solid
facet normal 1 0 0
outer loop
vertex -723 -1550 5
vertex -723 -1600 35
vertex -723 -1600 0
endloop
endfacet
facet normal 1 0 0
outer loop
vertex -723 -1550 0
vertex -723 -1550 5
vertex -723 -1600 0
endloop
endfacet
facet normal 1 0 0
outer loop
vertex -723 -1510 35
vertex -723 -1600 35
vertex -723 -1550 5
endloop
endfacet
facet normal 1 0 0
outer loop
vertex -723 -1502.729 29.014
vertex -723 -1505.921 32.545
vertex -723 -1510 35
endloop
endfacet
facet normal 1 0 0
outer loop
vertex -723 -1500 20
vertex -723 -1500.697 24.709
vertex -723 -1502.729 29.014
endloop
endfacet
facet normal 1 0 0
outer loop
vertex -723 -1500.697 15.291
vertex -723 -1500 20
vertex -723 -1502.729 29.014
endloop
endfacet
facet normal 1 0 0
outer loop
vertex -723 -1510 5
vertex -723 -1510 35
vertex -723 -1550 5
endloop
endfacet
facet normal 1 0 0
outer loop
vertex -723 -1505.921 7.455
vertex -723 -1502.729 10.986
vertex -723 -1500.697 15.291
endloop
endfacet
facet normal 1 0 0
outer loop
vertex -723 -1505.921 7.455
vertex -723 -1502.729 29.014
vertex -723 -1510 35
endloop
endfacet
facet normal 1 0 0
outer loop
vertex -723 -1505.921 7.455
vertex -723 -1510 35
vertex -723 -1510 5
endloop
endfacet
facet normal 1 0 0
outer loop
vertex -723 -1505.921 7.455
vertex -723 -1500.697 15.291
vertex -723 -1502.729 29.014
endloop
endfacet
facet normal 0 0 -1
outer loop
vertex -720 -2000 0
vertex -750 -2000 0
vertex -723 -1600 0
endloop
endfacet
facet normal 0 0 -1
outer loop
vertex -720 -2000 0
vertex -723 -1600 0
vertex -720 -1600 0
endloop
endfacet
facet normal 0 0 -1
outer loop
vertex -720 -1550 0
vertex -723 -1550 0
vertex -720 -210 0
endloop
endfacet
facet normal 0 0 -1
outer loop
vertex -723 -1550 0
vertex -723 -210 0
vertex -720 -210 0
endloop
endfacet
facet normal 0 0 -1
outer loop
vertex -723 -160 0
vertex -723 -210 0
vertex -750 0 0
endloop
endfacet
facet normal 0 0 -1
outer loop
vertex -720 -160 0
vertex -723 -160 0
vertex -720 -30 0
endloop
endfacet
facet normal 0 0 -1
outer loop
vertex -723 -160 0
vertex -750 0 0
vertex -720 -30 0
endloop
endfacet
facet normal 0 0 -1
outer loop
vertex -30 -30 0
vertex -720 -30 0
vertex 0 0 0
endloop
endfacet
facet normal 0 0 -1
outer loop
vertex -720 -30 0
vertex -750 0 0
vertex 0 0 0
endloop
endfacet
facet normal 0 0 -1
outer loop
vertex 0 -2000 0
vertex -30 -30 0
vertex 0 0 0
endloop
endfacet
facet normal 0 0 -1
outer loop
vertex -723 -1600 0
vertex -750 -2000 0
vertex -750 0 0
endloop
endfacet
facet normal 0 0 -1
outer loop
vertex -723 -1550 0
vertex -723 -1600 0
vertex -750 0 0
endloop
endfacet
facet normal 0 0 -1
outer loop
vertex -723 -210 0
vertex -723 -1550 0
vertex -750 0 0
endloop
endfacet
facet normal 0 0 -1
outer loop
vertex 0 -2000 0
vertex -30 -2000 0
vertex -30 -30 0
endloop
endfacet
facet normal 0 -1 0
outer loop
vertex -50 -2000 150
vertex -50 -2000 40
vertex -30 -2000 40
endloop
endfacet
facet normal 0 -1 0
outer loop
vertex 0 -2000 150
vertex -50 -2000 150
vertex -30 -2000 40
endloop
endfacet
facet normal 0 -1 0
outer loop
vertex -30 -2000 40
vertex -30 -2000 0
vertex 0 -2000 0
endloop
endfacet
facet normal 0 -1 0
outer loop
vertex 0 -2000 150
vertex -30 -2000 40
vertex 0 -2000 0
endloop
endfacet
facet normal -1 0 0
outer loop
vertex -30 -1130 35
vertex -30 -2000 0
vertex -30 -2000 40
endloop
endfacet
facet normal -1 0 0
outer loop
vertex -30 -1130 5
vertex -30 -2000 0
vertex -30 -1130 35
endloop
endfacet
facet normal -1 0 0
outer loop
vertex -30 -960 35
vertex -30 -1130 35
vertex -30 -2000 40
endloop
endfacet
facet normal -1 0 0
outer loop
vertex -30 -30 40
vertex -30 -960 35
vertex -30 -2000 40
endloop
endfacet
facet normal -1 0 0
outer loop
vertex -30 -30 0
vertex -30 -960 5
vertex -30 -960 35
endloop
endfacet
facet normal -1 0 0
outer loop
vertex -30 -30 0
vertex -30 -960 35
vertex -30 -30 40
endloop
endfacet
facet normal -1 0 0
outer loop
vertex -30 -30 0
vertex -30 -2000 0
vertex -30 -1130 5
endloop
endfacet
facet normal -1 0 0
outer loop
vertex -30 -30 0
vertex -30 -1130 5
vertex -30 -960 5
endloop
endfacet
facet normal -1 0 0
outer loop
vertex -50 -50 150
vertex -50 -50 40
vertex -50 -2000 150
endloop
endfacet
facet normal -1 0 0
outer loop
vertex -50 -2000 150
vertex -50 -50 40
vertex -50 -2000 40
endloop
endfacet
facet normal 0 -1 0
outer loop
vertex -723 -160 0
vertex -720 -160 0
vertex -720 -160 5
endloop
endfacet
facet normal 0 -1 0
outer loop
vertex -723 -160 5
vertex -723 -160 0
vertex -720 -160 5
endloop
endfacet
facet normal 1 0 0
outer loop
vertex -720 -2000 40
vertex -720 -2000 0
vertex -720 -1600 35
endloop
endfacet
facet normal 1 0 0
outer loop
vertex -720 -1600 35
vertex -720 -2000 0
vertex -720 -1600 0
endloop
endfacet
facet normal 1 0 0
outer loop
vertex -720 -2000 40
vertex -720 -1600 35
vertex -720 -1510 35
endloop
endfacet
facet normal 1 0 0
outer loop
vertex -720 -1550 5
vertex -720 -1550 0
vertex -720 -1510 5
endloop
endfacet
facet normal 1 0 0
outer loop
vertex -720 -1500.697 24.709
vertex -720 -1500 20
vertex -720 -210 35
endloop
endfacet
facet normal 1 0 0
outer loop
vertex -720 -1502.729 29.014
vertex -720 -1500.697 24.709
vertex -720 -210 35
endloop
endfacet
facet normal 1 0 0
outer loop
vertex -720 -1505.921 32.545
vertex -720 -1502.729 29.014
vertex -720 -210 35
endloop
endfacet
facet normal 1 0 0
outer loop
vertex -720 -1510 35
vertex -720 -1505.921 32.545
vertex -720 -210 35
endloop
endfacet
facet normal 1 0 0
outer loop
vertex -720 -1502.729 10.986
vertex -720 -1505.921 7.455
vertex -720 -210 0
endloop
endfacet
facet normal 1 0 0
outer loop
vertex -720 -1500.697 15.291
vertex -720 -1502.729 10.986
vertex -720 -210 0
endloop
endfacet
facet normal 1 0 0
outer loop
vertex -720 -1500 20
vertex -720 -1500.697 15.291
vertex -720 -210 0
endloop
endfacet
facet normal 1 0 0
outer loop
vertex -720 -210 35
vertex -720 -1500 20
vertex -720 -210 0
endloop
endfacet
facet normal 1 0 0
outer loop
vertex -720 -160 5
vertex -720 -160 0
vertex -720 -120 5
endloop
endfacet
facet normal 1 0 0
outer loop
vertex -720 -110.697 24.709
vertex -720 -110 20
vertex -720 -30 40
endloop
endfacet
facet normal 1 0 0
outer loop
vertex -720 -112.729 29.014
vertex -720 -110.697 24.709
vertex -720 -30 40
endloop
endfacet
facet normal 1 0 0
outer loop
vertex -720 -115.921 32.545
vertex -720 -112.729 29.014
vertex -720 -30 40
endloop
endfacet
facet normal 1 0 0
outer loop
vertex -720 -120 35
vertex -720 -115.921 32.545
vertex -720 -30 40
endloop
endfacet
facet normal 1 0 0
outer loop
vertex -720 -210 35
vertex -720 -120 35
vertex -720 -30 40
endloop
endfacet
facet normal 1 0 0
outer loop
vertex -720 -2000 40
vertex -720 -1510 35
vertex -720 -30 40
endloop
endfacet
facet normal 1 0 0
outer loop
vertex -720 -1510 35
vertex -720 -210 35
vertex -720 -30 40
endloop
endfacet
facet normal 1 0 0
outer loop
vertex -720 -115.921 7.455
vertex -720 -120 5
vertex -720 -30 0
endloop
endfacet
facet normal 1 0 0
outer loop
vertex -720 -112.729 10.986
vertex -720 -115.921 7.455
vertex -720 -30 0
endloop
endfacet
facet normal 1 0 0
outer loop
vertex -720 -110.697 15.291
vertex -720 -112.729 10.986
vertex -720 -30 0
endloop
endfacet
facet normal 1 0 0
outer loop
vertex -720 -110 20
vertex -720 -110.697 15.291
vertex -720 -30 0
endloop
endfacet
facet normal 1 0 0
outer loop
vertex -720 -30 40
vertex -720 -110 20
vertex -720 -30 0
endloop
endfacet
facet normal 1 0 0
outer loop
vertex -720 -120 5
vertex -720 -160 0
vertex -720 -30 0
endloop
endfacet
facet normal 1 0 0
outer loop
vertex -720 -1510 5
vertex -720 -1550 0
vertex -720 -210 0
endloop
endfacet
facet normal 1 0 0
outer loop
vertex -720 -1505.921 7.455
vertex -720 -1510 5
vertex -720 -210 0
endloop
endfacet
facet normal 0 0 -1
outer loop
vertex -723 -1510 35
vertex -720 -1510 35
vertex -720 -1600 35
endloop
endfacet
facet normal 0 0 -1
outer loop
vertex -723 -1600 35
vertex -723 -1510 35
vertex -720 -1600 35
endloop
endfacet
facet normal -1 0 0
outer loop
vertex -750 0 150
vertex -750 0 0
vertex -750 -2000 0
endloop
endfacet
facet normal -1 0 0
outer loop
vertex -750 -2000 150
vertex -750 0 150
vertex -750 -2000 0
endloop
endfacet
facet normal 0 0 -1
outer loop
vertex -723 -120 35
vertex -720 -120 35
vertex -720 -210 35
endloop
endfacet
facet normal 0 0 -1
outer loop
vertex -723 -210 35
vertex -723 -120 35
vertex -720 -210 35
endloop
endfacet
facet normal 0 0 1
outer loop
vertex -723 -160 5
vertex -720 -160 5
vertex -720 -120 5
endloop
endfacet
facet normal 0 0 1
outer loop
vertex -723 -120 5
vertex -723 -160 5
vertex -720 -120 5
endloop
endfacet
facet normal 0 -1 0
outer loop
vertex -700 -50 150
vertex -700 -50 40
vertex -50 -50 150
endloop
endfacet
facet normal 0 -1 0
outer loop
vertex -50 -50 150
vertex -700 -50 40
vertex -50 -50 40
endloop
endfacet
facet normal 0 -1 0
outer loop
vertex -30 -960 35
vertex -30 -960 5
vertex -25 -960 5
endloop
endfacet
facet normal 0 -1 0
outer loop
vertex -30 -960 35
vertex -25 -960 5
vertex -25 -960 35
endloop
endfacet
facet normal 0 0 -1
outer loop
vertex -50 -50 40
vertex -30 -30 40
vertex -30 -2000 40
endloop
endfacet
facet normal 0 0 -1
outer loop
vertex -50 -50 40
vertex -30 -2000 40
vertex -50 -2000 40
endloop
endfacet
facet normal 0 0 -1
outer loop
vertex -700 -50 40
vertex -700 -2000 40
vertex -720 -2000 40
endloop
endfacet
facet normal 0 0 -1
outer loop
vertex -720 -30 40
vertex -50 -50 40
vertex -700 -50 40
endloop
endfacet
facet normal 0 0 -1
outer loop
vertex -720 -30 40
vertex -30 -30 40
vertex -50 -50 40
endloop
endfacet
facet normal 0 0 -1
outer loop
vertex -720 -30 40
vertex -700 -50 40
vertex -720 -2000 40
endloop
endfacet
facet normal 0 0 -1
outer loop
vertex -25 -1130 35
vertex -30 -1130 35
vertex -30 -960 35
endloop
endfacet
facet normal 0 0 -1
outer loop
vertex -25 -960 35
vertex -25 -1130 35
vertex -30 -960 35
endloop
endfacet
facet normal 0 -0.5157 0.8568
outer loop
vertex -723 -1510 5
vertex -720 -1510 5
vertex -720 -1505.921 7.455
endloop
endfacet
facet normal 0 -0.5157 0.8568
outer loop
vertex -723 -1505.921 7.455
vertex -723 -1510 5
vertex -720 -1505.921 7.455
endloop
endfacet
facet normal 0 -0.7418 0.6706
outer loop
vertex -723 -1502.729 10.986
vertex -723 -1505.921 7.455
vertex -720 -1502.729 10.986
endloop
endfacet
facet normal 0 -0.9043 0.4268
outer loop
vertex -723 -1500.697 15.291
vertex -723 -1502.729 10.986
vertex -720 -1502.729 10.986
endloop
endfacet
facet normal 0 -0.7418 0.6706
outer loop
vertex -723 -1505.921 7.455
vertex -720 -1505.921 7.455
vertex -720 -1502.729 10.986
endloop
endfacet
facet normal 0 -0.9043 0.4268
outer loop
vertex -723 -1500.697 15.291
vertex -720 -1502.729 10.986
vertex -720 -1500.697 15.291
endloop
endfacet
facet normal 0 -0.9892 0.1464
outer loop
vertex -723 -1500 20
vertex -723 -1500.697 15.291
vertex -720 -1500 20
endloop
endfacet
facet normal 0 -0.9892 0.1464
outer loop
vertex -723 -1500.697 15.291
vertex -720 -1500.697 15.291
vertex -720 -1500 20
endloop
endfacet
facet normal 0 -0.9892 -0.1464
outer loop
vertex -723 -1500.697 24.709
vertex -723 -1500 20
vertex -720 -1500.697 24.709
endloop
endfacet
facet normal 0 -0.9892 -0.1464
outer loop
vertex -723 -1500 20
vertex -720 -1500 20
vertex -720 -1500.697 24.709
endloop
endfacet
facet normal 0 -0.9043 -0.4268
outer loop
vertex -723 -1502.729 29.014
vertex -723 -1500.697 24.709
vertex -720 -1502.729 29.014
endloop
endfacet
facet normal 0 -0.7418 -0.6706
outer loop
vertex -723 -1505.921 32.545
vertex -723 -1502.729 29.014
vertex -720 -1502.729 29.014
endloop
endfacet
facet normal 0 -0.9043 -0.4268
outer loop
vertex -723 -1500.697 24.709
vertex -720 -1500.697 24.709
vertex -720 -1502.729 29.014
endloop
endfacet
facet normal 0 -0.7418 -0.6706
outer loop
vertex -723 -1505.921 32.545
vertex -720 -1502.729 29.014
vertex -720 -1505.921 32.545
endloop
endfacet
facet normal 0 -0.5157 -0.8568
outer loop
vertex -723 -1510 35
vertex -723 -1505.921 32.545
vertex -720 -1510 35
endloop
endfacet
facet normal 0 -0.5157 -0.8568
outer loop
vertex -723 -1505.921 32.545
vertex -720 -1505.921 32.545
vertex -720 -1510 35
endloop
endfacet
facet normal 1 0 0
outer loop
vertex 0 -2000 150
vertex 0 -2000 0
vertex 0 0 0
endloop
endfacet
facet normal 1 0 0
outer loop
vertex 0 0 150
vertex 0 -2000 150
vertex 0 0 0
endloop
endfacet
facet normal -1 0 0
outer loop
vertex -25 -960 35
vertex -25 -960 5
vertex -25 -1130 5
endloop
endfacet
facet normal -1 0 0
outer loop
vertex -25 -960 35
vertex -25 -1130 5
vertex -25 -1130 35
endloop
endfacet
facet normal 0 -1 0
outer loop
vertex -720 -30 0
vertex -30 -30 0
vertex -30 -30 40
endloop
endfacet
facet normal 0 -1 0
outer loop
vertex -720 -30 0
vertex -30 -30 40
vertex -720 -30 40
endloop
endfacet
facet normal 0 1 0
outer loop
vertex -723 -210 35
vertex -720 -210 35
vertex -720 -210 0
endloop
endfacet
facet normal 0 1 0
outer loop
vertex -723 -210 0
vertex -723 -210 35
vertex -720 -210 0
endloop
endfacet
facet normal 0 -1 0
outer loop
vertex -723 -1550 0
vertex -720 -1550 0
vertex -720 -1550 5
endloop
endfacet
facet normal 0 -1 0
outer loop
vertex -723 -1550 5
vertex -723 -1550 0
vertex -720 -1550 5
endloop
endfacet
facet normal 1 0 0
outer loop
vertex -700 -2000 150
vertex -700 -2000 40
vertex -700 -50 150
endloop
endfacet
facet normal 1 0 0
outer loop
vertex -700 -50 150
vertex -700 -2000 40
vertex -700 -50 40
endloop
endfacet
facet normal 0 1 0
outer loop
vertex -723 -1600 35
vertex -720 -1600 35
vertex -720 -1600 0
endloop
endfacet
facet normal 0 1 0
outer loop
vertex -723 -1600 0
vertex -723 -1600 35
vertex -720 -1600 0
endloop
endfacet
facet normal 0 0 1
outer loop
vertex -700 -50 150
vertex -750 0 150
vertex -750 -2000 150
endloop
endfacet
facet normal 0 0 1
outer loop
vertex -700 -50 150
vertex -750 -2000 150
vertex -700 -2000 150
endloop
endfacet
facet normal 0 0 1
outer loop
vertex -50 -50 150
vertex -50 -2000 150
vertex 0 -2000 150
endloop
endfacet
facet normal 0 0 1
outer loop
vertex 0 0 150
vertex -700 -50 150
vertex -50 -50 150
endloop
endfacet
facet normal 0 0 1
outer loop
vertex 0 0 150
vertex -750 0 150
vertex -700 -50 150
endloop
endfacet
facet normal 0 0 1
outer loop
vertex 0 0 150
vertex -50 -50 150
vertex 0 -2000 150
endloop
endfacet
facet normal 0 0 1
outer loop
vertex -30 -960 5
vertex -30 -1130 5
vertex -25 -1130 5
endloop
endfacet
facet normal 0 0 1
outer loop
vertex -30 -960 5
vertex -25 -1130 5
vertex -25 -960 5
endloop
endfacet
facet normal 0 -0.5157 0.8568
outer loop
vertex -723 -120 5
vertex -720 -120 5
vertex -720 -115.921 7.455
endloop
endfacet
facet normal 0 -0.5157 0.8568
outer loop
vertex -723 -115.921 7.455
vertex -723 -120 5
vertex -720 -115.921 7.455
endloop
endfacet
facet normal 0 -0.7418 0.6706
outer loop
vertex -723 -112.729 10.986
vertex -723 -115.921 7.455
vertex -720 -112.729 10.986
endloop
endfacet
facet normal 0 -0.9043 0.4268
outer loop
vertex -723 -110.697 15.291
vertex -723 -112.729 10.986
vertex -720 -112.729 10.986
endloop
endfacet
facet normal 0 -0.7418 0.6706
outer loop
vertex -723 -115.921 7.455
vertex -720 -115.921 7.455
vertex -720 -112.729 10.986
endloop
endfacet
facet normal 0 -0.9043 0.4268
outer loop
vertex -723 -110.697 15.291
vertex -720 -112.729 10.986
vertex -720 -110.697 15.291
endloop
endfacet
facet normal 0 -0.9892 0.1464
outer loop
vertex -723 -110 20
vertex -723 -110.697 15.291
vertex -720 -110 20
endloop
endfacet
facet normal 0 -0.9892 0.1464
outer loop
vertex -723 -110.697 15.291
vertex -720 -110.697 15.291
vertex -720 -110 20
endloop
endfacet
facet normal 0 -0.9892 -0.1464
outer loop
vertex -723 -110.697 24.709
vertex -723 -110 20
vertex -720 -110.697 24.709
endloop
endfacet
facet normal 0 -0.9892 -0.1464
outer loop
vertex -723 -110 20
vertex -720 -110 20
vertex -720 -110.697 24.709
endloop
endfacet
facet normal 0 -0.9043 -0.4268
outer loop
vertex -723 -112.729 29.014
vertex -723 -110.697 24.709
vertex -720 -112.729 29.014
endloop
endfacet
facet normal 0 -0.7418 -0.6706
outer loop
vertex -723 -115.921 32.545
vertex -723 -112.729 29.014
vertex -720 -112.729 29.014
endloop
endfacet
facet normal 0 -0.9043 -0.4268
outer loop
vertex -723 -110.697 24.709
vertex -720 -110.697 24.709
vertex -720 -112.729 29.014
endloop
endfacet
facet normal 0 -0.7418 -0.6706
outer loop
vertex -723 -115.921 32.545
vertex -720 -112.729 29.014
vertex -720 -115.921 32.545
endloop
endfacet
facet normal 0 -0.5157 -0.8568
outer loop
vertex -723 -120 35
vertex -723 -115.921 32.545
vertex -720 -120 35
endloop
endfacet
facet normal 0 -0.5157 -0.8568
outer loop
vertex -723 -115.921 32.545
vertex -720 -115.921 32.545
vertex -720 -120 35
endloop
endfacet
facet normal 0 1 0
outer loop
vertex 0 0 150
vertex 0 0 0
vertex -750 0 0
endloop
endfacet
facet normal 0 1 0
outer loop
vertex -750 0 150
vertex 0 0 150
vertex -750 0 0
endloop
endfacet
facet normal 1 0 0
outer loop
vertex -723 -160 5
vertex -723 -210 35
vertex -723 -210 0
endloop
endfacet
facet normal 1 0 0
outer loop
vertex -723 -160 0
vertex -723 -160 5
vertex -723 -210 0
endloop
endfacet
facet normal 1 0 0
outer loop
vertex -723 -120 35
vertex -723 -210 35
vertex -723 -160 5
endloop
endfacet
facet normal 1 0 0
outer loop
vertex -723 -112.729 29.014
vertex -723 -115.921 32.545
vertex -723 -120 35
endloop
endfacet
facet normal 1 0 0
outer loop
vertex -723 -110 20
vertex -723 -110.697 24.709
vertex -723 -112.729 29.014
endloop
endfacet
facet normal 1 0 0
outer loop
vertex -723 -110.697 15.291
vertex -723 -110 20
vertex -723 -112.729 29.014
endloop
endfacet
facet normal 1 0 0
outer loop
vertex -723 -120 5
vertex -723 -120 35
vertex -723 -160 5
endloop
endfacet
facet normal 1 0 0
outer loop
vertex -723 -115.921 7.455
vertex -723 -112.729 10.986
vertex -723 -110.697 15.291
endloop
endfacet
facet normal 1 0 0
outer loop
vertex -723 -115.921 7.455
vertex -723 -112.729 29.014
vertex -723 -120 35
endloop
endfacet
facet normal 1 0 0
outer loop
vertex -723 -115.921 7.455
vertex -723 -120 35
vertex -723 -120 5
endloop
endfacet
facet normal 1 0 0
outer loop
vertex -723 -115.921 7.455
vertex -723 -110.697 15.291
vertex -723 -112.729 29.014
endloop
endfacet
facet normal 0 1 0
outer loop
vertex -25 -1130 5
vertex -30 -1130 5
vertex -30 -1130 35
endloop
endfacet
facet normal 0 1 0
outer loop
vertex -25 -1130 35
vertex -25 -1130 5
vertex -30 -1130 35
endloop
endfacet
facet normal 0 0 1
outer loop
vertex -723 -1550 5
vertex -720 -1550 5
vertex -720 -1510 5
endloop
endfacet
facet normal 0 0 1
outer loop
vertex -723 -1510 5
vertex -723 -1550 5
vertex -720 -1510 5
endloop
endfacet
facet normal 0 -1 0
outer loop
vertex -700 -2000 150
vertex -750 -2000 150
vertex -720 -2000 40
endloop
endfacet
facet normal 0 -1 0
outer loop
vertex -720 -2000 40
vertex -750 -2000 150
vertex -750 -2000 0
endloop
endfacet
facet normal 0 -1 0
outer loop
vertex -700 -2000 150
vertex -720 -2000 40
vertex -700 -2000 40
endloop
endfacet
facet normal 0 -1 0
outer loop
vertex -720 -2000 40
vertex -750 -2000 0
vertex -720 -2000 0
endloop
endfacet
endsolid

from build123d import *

# Parameters (mm, degrees)
BOSS_EXTRUDE1_DEPTH = 150
SKETCH4_W           = 690
SKETCH4_H           = 1970
CUT_EXTRUDE1_DEPTH  = 40
SKETCH5_W           = 30
SKETCH5_H           = 170
CUT_EXTRUDE2_DEPTH  = 5
CUT_EXTRUDE3_DEPTH  = 3


with BuildPart() as part:
    # Sketch1 → Boss-Extrude1 (new body)
    with BuildSketch(Plane.XY):
        Polygon((0, 0), (-750, 0), (-750, -2000), (-700, -2000), (-700, -50), (-50, -50), (-50, -2000), (0, -2000), align=None)
    extrude(amount=BOSS_EXTRUDE1_DEPTH)

    # Sketch4 → Cut-Extrude1 (cut)
    with BuildSketch(Plane(origin=(0, 0, 0), x_dir=(-1, 0, 0), z_dir=(0, 0, -1))):
        with Locations((375, -1015)):
            Rectangle(SKETCH4_W, SKETCH4_H)
    extrude(amount=-CUT_EXTRUDE1_DEPTH, mode=Mode.SUBTRACT)

    # Sketch5 → Cut-Extrude2 (cut)
    with BuildSketch(Plane.ZY.offset(30)):
        with Locations((20, -1045)):
            Rectangle(SKETCH5_W, SKETCH5_H)
    extrude(amount=-CUT_EXTRUDE2_DEPTH, mode=Mode.SUBTRACT)

    # Sketch6 → Cut-Extrude3 (cut)
    with BuildSketch(Plane(origin=(-720, 0, 0), x_dir=(0, 0, -1), z_dir=(1, 0, 0))):
        with BuildLine():
            Line((-35, -120), (-35, -210))
            Line((-35, -210), (0, -210))
            Line((0, -210), (0, -160))
            Line((0, -160), (-5, -160))
            Line((-5, -160), (-5, -120))
            ThreePointArc((-5, -120), (-20, -110), (-35, -120))
        make_face()
        with BuildLine():
            Line((-35, -1510), (-35, -1600))
            Line((-35, -1600), (0, -1600))
            Line((0, -1600), (0, -1550))
            Line((0, -1550), (-5, -1550))
            Line((-5, -1550), (-5, -1510))
            ThreePointArc((-5, -1510), (-20, -1500), (-35, -1510))
        make_face()
    extrude(amount=-CUT_EXTRUDE3_DEPTH, mode=Mode.SUBTRACT)


solid = part.part
